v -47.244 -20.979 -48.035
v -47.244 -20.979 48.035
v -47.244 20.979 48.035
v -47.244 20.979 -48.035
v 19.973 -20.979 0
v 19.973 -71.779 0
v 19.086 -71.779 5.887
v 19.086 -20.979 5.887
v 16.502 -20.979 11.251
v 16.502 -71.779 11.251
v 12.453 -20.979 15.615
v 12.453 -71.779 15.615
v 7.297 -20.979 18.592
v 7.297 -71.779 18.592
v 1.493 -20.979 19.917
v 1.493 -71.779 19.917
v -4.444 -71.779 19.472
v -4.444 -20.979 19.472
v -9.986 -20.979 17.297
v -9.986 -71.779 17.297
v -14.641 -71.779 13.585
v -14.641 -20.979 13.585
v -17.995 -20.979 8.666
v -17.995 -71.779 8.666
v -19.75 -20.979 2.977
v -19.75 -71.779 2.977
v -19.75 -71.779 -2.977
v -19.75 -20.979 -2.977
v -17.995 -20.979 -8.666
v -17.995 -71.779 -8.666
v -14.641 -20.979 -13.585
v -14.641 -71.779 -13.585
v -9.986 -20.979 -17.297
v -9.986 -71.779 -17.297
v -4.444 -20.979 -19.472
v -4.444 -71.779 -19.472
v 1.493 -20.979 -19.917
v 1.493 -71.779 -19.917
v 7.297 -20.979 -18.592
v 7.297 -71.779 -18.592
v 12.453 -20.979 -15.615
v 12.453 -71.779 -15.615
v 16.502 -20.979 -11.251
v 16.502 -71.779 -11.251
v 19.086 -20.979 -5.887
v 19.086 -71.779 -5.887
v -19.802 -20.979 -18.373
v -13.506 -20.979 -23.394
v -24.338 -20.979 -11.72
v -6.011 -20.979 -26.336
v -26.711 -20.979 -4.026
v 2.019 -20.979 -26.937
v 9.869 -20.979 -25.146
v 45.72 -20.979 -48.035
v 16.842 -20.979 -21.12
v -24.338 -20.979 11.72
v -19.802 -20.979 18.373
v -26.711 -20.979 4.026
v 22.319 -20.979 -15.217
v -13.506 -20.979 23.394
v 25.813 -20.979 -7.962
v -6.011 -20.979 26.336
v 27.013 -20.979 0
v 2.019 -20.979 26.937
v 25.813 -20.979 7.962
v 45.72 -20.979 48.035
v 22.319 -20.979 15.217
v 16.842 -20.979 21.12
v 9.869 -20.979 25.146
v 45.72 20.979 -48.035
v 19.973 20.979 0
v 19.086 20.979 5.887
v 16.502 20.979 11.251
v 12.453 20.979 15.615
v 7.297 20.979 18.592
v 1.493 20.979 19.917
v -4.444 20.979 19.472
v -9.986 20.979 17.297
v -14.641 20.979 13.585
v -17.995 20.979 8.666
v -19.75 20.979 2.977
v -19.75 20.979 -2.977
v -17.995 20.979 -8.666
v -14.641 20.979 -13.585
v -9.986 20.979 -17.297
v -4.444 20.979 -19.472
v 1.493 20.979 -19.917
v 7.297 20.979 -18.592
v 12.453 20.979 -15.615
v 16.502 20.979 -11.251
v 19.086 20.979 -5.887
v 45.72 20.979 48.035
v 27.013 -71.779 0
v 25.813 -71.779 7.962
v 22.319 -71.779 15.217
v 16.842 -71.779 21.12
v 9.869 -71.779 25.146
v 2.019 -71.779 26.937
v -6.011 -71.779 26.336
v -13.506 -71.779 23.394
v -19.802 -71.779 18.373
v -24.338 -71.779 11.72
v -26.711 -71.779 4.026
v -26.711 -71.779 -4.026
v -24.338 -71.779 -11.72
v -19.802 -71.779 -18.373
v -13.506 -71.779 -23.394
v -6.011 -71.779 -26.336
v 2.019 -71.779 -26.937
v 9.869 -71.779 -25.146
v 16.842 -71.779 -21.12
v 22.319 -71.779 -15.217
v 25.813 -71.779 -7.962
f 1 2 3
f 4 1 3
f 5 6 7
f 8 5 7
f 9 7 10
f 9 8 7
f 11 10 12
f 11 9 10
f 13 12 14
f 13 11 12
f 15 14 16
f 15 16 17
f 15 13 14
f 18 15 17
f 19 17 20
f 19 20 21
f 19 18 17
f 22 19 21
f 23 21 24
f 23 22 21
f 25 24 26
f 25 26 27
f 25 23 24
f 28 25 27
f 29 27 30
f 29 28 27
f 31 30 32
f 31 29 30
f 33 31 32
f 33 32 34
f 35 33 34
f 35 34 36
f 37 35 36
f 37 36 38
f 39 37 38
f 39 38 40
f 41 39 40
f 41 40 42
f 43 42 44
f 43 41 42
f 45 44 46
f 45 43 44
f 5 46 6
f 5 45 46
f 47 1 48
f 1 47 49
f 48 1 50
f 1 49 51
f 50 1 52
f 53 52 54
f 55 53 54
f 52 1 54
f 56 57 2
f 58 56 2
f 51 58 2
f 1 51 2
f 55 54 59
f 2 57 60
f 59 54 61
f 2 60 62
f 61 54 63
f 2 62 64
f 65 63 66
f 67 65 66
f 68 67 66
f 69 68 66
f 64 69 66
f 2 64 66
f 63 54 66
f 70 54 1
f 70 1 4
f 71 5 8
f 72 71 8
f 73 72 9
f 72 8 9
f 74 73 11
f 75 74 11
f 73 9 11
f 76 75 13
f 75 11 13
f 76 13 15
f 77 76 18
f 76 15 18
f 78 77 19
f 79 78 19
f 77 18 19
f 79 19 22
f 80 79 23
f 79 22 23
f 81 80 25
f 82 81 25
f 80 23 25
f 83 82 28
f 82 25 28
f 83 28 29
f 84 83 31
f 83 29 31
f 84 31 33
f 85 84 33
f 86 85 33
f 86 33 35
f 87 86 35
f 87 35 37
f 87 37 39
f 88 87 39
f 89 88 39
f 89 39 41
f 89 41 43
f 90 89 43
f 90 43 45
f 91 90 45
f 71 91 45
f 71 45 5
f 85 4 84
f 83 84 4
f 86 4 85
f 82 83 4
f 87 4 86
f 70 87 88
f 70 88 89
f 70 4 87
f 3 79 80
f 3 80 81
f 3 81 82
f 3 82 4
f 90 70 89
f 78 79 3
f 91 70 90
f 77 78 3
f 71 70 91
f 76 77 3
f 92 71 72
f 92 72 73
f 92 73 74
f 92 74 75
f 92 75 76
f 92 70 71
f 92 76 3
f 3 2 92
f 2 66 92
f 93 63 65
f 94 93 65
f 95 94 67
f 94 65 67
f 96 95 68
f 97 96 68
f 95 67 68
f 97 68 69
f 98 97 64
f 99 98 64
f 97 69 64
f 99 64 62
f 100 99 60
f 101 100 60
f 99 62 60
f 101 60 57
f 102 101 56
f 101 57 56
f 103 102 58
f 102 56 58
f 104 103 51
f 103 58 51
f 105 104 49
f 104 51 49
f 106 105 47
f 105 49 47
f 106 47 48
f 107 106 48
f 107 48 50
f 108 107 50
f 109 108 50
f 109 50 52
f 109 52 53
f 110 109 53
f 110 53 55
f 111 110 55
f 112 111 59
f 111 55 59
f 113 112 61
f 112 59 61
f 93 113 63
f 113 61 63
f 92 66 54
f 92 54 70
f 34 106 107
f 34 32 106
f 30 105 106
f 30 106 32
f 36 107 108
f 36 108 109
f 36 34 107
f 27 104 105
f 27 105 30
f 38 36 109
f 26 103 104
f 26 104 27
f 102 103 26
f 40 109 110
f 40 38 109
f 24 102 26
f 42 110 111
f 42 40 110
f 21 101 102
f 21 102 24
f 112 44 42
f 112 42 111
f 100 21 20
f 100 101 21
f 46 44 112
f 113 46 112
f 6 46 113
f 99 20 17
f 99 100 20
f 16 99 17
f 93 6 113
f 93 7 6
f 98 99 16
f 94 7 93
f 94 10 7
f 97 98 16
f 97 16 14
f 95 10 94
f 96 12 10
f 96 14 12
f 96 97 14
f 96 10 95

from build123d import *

# Parameters (mm, degrees)
F0_W     = 41.9582277536
F0_H     = 96.0698723793
F1_DEPTH = 45.72
F2_DEPTH = 47.244
F3_R     = 27.0129618135
F3_R_2   = 19.972912416
F4_DEPTH = 50.8
F5_DEPTH = 76.708


with BuildPart() as f1:
    # F0 (on Right) → F1 (new body)
    with BuildSketch(Plane.YZ):
        Rectangle(F0_W, F0_H)
    extrude(amount=F1_DEPTH)

    # F2 (add): a face of the model
    f2_faces = [f1.faces().sort_by_distance(p)[0] for p in [
        (0, 0, 0),
    ]]
    extrude(f2_faces, amount=F2_DEPTH)

    # F3 (on face) → F4 (join)
    with BuildSketch(Plane.XZ.offset(20.9791138768)):
        Circle(F3_R)
        Circle(F3_R_2, mode=Mode.SUBTRACT)
    extrude(amount=F4_DEPTH)

    # F5 (cut): a face of the model
    f5_faces = [f1.faces().sort_by_distance(p)[0] for p in [
        (0, -20.9791138768, 0),
    ]]
    extrude(f5_faces, amount=-F5_DEPTH, mode=Mode.SUBTRACT)


solid = f1.part
